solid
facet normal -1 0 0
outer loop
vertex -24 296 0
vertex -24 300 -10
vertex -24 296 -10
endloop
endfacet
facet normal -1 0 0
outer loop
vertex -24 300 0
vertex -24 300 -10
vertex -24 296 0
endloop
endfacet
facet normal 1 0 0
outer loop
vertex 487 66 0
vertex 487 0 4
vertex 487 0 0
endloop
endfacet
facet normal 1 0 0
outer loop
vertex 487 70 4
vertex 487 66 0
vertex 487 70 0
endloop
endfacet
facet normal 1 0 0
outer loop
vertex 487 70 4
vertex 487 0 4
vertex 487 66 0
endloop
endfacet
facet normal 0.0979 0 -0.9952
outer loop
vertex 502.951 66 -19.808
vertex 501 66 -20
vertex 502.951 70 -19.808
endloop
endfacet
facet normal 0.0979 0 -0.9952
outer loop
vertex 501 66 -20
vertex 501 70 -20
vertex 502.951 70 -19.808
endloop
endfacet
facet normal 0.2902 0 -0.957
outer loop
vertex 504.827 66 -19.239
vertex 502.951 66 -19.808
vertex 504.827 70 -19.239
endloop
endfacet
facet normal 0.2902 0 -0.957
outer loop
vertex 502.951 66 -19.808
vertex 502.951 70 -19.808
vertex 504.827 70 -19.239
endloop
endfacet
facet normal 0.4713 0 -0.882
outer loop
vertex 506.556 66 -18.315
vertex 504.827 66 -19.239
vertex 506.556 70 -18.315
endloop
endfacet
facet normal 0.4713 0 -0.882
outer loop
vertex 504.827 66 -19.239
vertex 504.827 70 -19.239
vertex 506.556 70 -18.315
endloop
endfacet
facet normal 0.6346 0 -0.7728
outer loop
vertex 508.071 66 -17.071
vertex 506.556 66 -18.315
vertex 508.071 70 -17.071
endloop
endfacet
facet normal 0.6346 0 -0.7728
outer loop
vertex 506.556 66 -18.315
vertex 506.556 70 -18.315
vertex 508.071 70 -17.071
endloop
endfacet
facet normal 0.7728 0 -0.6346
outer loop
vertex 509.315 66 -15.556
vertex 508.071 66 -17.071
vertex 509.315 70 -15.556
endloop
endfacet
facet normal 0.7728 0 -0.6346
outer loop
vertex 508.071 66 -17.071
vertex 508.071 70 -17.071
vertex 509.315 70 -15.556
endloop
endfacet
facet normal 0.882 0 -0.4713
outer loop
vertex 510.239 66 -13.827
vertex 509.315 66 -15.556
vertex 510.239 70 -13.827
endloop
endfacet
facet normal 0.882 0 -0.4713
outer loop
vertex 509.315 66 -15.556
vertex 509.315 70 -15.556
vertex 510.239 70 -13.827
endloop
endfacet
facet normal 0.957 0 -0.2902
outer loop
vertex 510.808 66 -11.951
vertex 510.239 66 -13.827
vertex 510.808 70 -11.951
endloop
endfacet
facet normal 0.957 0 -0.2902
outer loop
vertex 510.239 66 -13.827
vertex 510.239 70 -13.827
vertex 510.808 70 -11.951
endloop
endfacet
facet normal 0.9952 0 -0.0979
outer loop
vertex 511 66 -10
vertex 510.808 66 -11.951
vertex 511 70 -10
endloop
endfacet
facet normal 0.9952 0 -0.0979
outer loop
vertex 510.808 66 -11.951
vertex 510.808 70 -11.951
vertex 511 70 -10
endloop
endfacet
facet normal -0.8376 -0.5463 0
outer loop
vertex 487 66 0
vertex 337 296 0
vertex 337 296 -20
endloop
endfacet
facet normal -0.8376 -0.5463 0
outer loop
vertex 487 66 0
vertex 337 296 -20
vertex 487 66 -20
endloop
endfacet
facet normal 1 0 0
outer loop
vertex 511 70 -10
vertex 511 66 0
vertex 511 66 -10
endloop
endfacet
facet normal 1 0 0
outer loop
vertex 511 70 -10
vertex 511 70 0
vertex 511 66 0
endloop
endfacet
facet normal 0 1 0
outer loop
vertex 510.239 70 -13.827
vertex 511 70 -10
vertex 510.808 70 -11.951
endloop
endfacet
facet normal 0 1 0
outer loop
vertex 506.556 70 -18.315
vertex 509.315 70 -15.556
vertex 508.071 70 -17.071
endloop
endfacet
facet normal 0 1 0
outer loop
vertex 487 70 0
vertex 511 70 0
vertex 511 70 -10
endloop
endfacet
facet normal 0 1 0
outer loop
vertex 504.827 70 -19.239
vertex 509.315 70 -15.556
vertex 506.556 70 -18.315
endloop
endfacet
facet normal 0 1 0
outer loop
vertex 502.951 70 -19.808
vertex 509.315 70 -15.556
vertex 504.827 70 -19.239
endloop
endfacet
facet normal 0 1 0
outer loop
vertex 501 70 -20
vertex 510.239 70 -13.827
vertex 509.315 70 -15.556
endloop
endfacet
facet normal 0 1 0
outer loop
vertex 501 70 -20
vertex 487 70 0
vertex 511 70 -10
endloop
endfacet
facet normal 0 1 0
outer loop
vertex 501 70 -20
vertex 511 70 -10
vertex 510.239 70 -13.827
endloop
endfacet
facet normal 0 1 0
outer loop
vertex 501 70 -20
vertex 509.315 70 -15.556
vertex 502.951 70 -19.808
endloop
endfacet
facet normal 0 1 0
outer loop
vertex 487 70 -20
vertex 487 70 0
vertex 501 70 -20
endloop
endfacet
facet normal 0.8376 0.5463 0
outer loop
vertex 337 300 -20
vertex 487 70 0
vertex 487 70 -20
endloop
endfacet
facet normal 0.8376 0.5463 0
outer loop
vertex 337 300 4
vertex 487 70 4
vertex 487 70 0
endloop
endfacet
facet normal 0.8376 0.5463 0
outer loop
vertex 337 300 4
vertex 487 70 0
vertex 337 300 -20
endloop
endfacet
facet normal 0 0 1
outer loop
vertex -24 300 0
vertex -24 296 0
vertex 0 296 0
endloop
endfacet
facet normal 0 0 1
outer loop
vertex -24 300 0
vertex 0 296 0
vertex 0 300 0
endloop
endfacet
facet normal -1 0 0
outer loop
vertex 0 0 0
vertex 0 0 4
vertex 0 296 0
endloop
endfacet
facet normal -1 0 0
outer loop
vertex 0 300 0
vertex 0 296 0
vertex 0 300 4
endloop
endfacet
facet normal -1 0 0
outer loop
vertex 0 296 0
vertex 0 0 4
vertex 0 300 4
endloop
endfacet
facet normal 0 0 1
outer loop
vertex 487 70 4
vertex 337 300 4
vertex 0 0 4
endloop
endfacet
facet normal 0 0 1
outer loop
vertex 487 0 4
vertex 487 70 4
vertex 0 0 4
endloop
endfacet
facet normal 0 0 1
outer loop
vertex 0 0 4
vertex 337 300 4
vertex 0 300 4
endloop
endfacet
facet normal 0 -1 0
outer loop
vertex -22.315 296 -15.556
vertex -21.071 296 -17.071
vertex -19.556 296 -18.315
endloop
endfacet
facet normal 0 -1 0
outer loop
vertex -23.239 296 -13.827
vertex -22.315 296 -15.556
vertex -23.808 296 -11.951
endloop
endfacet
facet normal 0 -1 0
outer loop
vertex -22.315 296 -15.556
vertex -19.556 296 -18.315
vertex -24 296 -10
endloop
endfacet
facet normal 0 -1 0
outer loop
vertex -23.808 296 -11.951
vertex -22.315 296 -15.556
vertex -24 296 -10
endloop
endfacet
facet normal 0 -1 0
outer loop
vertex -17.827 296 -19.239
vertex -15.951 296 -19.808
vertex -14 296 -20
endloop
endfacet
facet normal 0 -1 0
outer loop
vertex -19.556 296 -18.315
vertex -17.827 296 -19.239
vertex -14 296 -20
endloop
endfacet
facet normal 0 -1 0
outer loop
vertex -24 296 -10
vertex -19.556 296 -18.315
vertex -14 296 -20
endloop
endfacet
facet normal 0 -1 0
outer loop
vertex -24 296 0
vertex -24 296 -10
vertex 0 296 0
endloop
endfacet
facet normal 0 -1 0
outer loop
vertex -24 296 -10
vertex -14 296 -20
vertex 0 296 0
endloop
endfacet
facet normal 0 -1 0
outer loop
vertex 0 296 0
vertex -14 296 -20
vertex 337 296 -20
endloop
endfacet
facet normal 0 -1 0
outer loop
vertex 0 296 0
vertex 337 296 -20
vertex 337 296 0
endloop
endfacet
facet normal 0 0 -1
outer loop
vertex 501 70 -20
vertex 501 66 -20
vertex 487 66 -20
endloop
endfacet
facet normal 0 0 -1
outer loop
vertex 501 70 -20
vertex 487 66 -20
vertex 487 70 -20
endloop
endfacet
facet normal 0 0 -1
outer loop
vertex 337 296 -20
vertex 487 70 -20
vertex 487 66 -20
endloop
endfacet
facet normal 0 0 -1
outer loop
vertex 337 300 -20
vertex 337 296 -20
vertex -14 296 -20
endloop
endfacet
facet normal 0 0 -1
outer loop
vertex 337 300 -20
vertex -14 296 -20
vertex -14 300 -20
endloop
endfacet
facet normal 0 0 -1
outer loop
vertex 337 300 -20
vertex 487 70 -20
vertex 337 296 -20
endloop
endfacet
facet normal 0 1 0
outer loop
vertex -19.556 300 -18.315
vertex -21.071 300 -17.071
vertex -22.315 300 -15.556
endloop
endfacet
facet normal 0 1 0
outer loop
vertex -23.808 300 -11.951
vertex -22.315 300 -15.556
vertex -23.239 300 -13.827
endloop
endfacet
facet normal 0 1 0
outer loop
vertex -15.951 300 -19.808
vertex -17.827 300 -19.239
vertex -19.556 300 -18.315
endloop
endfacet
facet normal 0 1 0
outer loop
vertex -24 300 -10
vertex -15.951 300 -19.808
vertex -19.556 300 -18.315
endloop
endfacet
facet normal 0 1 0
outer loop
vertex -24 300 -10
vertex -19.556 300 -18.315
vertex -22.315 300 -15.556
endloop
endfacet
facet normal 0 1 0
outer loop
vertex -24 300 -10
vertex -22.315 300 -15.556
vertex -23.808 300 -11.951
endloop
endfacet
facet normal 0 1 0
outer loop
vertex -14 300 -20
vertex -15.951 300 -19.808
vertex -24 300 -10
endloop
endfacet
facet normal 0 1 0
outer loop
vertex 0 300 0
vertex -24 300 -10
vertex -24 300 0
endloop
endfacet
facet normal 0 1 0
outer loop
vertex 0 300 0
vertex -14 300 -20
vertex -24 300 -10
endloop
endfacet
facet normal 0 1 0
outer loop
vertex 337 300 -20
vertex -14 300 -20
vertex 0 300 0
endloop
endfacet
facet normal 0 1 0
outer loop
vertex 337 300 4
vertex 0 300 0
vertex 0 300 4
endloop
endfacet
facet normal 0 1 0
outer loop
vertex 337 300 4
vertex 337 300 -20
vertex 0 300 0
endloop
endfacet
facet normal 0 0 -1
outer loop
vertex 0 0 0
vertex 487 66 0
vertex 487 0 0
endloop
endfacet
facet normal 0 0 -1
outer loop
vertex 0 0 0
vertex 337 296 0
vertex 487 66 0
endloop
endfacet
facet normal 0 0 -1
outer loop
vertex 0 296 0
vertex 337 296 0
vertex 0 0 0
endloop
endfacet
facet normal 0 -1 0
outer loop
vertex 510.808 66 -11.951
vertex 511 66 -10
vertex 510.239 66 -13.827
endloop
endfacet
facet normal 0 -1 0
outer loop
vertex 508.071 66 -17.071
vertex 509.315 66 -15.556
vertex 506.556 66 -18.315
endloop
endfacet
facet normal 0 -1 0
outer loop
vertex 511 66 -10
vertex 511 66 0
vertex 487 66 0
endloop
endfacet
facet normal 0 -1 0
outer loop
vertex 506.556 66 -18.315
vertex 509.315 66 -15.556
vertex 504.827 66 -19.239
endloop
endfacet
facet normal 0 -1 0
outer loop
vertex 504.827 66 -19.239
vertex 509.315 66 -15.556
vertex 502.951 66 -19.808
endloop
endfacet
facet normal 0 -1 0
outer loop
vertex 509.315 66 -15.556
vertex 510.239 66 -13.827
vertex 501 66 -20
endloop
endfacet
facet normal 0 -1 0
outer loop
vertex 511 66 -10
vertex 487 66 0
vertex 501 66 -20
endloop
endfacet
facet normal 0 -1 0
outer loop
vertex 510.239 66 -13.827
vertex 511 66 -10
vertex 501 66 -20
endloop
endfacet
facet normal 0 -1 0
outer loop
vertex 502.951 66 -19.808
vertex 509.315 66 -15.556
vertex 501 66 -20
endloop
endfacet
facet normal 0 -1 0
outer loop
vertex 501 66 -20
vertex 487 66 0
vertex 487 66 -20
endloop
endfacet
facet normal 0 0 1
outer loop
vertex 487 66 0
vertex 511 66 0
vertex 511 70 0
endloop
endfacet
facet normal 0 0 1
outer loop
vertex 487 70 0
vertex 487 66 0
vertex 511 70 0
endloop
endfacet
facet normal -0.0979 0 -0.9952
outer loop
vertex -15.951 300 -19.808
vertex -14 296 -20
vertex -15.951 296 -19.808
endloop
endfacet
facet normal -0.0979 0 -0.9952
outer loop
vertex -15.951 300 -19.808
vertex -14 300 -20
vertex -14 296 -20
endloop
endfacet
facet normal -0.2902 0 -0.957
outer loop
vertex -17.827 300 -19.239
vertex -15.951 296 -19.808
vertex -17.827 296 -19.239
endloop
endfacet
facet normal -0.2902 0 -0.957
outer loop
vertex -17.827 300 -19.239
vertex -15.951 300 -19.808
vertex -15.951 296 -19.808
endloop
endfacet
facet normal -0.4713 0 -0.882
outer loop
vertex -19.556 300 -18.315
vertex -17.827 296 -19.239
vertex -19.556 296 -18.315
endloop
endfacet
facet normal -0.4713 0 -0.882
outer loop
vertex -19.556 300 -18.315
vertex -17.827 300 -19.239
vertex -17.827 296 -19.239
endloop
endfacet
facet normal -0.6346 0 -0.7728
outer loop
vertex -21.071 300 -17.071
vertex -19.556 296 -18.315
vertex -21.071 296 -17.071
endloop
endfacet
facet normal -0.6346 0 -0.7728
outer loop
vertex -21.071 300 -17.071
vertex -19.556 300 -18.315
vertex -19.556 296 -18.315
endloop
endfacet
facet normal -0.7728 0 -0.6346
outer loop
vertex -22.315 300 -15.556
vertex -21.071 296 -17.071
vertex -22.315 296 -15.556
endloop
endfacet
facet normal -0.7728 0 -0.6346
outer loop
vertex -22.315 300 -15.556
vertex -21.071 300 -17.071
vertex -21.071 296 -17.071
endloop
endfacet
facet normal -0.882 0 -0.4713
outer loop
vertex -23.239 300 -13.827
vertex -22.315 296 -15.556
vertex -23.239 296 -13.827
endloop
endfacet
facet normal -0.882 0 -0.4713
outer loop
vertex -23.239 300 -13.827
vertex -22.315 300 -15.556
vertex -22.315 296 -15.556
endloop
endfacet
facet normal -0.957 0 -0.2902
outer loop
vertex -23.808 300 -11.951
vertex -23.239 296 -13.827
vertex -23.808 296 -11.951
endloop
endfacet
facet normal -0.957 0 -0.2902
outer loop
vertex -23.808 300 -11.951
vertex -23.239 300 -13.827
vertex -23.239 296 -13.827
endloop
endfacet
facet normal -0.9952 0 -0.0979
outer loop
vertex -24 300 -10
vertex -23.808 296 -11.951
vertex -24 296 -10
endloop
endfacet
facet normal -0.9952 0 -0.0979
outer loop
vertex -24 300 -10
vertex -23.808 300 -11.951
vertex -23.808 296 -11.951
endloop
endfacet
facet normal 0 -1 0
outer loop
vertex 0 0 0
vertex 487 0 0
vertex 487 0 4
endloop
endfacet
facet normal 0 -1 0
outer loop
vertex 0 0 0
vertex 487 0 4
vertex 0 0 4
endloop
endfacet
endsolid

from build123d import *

# Parameters (mm, degrees)
BOSS_EXTRUDE1_DEPTH = 4
SKETCH2_W           = 337
SKETCH2_H           = 4
BOSS_EXTRUDE2_DEPTH = 20
BOSS_EXTRUDE3_DEPTH = 20
SKETCH7_W           = 20
SKETCH7_H           = 4
BOSS_EXTRUDE6_DEPTH = 24
SKETCH8_W           = 20
SKETCH8_H           = 4
BOSS_EXTRUDE7_DEPTH = 24
FILLET1_R           = 10


with BuildPart() as part:
    # Sketch1 → Boss-Extrude1 (new body)
    with BuildSketch(Plane.XY):
        Polygon((0, 0), (0, 300), (337, 300), (487, 70), (487, 0), align=None)
    extrude(amount=BOSS_EXTRUDE1_DEPTH)

    # Sketch2 → Boss-Extrude2 (add)
    with BuildSketch(Plane(origin=(0, 0, 0), x_dir=(-1, 0, 0), z_dir=(0, 0, -1))):
        with Locations((-168.5, 298)):
            Rectangle(SKETCH2_W, SKETCH2_H)
    extrude(amount=BOSS_EXTRUDE2_DEPTH)

    # Sketch3 → Boss-Extrude3 (add)
    with BuildSketch(Plane(origin=(0, 0, 0), x_dir=(-1, 0, 0), z_dir=(0, 0, -1))):
        Polygon((-337, 300), (-337, 296), (-487, 66), (-487, 70), align=None)
    extrude(amount=BOSS_EXTRUDE3_DEPTH)

    # Sketch7 → Boss-Extrude6 (add)
    with BuildSketch(Plane(origin=(487, 0, 0), x_dir=(0, 0, -1), z_dir=(1, 0, 0))):
        with Locations((10, 68)):
            Rectangle(SKETCH7_W, SKETCH7_H)
    extrude(amount=BOSS_EXTRUDE6_DEPTH)

    # Sketch8 → Boss-Extrude7 (add)
    with BuildSketch(Plane.ZY):
        with Locations((-10, 298)):
            Rectangle(SKETCH8_W, SKETCH8_H)
    extrude(amount=BOSS_EXTRUDE7_DEPTH)

    # Fillet1
    fillet1_edges = [part.edges().sort_by_distance(p)[0] for p in [
        (511, 68, -20),
        (-24, 298, -20),
    ]]
    fillet(fillet1_edges, radius=FILLET1_R)


solid = part.part
